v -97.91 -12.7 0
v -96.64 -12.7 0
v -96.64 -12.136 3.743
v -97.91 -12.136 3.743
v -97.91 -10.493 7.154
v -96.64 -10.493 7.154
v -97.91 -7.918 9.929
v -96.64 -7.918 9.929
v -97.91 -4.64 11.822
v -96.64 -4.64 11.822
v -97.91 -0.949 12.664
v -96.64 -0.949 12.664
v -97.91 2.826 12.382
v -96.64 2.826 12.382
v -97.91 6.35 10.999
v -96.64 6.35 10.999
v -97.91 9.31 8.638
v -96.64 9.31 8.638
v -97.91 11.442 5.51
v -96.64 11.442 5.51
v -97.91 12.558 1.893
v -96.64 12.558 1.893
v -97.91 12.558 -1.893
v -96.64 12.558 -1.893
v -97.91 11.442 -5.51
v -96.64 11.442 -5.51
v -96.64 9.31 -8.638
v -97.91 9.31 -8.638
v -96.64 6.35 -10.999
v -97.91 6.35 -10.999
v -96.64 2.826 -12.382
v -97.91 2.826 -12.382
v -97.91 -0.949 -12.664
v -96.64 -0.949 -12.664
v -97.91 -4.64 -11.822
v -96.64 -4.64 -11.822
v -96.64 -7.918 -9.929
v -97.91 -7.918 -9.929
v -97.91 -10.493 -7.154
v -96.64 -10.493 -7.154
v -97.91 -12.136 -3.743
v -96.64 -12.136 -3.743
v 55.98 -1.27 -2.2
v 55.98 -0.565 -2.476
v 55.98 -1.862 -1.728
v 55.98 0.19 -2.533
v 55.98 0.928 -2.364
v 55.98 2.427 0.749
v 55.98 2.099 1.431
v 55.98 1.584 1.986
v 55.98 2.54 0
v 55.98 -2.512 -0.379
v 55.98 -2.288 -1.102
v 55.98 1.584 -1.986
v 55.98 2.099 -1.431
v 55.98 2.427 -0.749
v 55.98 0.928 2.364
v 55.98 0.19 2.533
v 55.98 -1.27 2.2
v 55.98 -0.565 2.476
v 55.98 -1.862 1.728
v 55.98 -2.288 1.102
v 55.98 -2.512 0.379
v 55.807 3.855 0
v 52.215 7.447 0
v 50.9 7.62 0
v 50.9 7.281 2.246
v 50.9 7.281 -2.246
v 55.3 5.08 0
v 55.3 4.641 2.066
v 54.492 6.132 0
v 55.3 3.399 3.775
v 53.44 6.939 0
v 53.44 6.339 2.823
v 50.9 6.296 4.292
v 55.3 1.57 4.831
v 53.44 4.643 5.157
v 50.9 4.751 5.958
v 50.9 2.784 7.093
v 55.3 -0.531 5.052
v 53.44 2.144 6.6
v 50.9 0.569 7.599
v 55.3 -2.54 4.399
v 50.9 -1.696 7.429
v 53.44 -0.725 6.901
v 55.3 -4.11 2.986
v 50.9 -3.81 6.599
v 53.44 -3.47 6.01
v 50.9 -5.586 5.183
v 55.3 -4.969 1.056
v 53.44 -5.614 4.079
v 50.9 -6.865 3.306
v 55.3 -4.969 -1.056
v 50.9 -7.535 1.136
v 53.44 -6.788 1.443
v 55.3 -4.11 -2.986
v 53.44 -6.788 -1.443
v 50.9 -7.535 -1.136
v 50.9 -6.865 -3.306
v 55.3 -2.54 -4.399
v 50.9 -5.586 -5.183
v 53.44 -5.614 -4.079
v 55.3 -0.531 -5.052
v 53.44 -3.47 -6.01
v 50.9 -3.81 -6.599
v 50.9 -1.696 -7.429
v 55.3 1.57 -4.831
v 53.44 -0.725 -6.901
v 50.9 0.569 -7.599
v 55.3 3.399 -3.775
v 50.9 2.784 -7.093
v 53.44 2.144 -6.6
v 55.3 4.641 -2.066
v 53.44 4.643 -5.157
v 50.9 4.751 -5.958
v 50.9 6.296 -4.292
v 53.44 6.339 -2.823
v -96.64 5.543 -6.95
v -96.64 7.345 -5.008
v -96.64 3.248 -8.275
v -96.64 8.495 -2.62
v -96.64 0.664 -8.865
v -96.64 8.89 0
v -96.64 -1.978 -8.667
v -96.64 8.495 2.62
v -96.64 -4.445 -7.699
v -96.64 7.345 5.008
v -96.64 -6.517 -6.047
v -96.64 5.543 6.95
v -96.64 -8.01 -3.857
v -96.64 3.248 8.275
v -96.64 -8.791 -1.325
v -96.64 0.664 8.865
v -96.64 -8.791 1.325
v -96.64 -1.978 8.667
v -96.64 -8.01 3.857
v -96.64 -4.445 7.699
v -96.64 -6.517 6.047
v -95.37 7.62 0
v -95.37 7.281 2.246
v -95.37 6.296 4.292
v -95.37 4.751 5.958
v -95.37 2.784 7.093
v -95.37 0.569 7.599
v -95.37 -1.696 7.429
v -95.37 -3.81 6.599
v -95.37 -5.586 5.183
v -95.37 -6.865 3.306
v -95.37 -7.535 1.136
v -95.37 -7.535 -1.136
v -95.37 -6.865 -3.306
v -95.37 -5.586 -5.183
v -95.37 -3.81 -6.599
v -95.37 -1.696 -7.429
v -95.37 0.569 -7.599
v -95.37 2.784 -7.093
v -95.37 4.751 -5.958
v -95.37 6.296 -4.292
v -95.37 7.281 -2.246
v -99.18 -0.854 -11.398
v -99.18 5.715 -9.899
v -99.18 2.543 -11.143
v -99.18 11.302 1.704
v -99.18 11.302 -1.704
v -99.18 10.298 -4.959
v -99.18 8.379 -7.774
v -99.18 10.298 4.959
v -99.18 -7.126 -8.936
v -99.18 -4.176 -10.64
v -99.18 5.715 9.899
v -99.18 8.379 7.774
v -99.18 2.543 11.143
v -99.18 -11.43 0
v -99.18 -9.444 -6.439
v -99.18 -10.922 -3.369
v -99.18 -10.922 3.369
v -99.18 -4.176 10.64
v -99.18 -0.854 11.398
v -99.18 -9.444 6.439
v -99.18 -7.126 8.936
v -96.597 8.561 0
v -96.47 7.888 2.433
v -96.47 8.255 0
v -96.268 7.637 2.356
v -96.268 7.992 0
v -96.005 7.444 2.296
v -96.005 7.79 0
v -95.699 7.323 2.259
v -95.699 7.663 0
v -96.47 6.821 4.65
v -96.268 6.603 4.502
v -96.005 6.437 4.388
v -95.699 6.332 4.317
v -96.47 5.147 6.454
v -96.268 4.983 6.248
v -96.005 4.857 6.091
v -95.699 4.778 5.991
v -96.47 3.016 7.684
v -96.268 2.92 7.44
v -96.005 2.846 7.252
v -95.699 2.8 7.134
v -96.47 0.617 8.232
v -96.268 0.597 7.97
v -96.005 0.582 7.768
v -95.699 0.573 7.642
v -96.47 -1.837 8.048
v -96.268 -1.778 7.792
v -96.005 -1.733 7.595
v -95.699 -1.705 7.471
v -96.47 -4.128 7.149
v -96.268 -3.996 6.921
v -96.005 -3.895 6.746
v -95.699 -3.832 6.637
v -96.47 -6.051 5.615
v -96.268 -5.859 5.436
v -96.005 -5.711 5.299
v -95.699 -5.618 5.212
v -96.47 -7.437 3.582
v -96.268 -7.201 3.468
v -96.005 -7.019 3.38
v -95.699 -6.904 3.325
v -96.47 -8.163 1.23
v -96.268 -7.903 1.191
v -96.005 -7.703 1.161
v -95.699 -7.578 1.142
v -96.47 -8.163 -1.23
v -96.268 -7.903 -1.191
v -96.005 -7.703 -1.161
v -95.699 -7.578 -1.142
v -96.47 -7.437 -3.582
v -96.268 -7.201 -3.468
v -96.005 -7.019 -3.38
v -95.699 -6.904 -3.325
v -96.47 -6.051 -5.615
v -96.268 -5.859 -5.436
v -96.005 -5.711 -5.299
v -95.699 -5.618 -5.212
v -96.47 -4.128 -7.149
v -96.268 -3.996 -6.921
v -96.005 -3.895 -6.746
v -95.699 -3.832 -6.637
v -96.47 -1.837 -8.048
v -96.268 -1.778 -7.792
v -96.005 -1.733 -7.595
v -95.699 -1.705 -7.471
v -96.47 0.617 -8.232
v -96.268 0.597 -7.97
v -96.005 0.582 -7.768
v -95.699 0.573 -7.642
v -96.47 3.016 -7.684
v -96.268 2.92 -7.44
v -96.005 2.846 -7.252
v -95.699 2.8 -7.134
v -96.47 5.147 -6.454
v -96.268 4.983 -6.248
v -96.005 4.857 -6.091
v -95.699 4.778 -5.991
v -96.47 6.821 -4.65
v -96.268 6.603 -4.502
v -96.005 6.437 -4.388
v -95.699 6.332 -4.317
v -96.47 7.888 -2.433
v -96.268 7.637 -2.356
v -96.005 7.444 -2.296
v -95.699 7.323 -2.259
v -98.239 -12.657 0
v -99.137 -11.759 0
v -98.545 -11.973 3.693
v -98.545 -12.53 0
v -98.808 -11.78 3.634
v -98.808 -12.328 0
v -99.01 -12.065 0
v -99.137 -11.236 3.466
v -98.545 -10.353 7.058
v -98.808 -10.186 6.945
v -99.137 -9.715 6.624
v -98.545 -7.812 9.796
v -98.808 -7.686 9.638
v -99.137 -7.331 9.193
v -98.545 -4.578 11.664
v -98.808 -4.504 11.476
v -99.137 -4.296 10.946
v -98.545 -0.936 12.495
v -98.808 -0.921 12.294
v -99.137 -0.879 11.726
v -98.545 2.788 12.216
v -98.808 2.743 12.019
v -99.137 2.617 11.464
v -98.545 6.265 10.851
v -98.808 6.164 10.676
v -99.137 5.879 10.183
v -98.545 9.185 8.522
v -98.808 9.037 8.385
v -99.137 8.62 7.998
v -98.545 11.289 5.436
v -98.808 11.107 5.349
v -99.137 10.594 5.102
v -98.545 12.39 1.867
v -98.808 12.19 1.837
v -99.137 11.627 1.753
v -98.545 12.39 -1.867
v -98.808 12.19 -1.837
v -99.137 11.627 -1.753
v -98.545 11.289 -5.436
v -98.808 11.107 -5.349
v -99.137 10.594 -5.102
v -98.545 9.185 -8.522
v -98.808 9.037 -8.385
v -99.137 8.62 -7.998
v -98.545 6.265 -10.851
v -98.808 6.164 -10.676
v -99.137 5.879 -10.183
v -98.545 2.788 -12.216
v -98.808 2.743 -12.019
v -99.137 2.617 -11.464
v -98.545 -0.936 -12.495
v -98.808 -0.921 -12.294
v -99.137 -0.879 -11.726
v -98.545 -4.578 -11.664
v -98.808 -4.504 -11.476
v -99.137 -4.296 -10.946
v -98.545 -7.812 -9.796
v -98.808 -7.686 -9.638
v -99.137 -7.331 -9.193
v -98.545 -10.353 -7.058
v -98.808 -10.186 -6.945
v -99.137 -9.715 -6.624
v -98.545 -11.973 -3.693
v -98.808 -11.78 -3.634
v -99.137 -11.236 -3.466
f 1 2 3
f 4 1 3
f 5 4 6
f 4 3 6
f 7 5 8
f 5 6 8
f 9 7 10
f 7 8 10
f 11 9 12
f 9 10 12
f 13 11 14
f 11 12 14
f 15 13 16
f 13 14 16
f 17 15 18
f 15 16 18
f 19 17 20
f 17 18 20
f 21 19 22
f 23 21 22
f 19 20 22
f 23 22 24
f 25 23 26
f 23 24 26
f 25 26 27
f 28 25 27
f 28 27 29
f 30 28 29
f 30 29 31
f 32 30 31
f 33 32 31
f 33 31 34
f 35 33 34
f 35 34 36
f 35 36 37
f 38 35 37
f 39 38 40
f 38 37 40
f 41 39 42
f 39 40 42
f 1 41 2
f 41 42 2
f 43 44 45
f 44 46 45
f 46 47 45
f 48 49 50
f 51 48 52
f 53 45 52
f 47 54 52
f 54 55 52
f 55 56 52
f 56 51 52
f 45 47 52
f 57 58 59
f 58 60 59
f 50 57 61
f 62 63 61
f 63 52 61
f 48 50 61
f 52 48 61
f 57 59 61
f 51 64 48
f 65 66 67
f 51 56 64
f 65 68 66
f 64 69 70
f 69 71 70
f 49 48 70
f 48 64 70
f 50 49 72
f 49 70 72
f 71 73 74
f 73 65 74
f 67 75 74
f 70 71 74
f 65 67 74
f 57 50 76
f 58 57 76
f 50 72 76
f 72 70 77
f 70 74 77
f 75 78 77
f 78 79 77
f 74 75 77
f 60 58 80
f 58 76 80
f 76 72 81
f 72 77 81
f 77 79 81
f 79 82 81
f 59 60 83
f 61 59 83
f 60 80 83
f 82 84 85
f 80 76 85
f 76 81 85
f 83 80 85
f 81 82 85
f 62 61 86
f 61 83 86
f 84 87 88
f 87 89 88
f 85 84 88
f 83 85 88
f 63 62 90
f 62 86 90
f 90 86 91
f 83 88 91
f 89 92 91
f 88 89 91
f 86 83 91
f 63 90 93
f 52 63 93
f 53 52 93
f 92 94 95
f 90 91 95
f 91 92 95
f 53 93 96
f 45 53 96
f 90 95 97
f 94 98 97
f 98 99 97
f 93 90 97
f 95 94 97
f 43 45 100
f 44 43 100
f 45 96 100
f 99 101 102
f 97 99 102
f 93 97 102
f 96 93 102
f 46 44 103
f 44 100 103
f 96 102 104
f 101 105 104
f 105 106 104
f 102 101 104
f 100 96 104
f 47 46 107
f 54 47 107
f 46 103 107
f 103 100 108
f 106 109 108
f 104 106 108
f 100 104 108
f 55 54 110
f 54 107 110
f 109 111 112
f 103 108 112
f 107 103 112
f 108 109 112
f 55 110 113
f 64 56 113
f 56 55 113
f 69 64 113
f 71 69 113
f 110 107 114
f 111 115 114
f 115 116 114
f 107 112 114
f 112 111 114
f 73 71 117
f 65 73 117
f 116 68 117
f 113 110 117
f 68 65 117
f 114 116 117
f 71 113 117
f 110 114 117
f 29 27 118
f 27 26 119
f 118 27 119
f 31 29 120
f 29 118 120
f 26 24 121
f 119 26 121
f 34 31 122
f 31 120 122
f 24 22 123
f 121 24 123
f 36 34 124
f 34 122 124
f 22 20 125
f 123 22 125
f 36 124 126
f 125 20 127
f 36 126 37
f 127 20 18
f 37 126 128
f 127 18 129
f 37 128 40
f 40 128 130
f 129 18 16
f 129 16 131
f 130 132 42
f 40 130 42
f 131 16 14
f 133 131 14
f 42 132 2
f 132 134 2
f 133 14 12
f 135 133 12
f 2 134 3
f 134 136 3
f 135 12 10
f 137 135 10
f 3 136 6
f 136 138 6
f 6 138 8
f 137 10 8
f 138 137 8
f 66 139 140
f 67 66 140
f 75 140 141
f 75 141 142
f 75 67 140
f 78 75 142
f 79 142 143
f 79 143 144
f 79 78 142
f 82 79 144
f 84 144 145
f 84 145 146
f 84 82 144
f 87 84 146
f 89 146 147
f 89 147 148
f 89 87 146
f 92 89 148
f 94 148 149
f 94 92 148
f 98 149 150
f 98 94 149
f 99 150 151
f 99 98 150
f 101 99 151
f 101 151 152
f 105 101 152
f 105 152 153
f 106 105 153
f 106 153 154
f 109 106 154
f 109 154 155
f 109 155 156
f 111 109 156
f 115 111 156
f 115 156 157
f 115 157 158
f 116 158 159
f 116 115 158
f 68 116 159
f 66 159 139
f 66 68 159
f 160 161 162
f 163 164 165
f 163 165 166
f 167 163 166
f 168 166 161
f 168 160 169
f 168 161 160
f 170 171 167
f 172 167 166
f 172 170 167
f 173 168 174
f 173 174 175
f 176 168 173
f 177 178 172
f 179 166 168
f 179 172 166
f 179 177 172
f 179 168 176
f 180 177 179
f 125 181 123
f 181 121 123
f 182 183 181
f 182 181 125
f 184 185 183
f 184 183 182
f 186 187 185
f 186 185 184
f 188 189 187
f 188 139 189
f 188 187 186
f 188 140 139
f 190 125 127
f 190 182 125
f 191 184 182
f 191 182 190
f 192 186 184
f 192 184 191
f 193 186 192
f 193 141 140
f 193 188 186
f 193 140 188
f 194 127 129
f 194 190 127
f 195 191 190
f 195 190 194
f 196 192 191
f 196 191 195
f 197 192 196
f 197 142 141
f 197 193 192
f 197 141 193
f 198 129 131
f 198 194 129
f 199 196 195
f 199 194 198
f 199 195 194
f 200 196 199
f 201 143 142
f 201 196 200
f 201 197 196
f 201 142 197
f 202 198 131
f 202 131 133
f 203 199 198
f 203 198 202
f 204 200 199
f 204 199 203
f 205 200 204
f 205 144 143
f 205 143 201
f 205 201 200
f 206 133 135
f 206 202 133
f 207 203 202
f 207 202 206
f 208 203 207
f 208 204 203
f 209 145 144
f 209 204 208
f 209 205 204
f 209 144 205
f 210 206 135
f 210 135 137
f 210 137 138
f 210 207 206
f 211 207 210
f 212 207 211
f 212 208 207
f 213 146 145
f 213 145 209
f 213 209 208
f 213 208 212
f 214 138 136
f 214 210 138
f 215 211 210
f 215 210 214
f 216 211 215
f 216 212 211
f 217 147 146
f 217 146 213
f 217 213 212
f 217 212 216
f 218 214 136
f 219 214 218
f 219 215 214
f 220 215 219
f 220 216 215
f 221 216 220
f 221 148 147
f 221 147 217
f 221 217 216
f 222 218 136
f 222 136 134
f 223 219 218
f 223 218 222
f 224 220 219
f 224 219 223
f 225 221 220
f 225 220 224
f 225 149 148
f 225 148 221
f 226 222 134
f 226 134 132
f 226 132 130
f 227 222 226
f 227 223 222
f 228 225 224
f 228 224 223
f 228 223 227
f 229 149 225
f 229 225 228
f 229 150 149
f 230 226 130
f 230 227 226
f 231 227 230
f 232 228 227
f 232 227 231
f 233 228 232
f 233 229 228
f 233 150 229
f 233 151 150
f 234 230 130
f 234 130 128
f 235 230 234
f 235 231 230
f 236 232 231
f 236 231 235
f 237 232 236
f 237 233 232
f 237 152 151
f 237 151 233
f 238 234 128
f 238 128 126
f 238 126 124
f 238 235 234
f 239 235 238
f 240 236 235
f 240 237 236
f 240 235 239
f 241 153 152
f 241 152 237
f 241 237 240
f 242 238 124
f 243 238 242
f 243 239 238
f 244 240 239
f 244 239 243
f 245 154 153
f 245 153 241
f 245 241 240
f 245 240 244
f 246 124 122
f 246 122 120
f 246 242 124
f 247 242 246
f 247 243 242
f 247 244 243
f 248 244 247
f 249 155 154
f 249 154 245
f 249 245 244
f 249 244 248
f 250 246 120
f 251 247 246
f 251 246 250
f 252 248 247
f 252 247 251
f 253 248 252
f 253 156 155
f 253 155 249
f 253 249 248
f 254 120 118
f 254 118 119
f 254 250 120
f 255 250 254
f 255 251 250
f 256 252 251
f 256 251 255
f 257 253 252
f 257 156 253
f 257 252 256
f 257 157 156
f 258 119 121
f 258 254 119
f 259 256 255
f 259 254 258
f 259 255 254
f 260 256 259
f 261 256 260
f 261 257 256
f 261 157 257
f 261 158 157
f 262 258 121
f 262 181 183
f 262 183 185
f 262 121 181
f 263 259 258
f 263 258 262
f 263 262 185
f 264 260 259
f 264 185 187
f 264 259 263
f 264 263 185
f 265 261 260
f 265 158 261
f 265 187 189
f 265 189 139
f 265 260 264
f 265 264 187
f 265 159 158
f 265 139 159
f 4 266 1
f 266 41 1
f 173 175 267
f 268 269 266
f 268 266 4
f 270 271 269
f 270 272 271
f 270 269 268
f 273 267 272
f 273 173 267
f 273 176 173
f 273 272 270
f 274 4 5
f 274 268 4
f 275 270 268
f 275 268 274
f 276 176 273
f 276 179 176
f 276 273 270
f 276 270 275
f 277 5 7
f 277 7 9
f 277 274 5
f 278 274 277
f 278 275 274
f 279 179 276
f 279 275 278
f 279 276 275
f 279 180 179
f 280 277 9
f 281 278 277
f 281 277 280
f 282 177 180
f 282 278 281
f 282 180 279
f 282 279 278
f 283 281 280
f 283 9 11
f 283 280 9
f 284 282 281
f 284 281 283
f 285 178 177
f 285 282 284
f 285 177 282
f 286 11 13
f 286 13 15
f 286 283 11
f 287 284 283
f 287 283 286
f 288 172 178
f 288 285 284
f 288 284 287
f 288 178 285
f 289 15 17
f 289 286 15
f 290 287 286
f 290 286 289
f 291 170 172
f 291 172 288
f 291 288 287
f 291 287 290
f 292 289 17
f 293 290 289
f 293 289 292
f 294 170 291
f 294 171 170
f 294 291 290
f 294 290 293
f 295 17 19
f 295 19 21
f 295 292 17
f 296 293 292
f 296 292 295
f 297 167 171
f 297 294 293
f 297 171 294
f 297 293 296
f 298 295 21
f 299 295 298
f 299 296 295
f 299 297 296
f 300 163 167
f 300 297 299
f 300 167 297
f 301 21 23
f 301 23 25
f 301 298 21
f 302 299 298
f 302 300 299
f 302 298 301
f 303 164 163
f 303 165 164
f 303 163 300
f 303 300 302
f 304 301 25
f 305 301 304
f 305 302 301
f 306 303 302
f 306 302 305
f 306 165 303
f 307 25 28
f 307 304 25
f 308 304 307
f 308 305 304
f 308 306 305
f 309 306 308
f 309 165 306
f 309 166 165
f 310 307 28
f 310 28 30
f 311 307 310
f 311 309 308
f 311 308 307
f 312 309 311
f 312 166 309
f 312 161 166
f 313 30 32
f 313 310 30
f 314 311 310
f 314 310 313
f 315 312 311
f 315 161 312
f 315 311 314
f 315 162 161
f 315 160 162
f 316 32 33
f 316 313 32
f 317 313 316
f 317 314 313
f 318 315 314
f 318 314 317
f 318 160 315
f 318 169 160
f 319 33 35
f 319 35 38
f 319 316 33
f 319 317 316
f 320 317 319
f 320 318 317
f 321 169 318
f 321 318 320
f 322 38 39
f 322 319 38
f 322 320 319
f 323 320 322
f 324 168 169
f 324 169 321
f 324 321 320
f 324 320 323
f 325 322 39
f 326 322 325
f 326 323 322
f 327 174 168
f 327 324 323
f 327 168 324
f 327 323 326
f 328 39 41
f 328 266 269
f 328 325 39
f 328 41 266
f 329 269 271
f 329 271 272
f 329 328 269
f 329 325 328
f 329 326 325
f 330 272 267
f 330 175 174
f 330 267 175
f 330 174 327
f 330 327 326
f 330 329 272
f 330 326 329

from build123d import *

# Parameters (mm, degrees)
F0_W     = 152.620156
F0_H     = 7.62
F2_R     = 5.08
F3_R     = 12.7
F4_DEPTH = 2.54
F5_R     = 1.27


with BuildPart() as f1:
    # F0 (on Top) → F1 (revolve)
    with BuildSketch(Plane.XY):
        with Locations((-20.329764, 3.81)):
            Rectangle(F0_W, F0_H)
    revolve(axis=Axis((-20.329764, 0, 0), (1, 0, 0)))

    # F2
    f2_edges = [f1.edges().sort_by_distance(p)[0] for p in [
        (55.980314, -7.62, 0),
    ]]
    fillet(f2_edges, radius=F2_R)

    # F3 (on face) → F4 (join)
    with BuildSketch(Plane(origin=(-96.639842, 0, 0), x_dir=(0, -1, 0), z_dir=(-1, 0, 0))):
        Circle(F3_R)
    extrude(amount=F4_DEPTH)

    # F5
    f5_edges = [f1.edges().sort_by_distance(p)[0] for p in [
        (-99.179842, 12.7, 0),
        (-96.639842, -7.62, 0),
    ]]
    fillet(f5_edges, radius=F5_R)


solid = f1.part
